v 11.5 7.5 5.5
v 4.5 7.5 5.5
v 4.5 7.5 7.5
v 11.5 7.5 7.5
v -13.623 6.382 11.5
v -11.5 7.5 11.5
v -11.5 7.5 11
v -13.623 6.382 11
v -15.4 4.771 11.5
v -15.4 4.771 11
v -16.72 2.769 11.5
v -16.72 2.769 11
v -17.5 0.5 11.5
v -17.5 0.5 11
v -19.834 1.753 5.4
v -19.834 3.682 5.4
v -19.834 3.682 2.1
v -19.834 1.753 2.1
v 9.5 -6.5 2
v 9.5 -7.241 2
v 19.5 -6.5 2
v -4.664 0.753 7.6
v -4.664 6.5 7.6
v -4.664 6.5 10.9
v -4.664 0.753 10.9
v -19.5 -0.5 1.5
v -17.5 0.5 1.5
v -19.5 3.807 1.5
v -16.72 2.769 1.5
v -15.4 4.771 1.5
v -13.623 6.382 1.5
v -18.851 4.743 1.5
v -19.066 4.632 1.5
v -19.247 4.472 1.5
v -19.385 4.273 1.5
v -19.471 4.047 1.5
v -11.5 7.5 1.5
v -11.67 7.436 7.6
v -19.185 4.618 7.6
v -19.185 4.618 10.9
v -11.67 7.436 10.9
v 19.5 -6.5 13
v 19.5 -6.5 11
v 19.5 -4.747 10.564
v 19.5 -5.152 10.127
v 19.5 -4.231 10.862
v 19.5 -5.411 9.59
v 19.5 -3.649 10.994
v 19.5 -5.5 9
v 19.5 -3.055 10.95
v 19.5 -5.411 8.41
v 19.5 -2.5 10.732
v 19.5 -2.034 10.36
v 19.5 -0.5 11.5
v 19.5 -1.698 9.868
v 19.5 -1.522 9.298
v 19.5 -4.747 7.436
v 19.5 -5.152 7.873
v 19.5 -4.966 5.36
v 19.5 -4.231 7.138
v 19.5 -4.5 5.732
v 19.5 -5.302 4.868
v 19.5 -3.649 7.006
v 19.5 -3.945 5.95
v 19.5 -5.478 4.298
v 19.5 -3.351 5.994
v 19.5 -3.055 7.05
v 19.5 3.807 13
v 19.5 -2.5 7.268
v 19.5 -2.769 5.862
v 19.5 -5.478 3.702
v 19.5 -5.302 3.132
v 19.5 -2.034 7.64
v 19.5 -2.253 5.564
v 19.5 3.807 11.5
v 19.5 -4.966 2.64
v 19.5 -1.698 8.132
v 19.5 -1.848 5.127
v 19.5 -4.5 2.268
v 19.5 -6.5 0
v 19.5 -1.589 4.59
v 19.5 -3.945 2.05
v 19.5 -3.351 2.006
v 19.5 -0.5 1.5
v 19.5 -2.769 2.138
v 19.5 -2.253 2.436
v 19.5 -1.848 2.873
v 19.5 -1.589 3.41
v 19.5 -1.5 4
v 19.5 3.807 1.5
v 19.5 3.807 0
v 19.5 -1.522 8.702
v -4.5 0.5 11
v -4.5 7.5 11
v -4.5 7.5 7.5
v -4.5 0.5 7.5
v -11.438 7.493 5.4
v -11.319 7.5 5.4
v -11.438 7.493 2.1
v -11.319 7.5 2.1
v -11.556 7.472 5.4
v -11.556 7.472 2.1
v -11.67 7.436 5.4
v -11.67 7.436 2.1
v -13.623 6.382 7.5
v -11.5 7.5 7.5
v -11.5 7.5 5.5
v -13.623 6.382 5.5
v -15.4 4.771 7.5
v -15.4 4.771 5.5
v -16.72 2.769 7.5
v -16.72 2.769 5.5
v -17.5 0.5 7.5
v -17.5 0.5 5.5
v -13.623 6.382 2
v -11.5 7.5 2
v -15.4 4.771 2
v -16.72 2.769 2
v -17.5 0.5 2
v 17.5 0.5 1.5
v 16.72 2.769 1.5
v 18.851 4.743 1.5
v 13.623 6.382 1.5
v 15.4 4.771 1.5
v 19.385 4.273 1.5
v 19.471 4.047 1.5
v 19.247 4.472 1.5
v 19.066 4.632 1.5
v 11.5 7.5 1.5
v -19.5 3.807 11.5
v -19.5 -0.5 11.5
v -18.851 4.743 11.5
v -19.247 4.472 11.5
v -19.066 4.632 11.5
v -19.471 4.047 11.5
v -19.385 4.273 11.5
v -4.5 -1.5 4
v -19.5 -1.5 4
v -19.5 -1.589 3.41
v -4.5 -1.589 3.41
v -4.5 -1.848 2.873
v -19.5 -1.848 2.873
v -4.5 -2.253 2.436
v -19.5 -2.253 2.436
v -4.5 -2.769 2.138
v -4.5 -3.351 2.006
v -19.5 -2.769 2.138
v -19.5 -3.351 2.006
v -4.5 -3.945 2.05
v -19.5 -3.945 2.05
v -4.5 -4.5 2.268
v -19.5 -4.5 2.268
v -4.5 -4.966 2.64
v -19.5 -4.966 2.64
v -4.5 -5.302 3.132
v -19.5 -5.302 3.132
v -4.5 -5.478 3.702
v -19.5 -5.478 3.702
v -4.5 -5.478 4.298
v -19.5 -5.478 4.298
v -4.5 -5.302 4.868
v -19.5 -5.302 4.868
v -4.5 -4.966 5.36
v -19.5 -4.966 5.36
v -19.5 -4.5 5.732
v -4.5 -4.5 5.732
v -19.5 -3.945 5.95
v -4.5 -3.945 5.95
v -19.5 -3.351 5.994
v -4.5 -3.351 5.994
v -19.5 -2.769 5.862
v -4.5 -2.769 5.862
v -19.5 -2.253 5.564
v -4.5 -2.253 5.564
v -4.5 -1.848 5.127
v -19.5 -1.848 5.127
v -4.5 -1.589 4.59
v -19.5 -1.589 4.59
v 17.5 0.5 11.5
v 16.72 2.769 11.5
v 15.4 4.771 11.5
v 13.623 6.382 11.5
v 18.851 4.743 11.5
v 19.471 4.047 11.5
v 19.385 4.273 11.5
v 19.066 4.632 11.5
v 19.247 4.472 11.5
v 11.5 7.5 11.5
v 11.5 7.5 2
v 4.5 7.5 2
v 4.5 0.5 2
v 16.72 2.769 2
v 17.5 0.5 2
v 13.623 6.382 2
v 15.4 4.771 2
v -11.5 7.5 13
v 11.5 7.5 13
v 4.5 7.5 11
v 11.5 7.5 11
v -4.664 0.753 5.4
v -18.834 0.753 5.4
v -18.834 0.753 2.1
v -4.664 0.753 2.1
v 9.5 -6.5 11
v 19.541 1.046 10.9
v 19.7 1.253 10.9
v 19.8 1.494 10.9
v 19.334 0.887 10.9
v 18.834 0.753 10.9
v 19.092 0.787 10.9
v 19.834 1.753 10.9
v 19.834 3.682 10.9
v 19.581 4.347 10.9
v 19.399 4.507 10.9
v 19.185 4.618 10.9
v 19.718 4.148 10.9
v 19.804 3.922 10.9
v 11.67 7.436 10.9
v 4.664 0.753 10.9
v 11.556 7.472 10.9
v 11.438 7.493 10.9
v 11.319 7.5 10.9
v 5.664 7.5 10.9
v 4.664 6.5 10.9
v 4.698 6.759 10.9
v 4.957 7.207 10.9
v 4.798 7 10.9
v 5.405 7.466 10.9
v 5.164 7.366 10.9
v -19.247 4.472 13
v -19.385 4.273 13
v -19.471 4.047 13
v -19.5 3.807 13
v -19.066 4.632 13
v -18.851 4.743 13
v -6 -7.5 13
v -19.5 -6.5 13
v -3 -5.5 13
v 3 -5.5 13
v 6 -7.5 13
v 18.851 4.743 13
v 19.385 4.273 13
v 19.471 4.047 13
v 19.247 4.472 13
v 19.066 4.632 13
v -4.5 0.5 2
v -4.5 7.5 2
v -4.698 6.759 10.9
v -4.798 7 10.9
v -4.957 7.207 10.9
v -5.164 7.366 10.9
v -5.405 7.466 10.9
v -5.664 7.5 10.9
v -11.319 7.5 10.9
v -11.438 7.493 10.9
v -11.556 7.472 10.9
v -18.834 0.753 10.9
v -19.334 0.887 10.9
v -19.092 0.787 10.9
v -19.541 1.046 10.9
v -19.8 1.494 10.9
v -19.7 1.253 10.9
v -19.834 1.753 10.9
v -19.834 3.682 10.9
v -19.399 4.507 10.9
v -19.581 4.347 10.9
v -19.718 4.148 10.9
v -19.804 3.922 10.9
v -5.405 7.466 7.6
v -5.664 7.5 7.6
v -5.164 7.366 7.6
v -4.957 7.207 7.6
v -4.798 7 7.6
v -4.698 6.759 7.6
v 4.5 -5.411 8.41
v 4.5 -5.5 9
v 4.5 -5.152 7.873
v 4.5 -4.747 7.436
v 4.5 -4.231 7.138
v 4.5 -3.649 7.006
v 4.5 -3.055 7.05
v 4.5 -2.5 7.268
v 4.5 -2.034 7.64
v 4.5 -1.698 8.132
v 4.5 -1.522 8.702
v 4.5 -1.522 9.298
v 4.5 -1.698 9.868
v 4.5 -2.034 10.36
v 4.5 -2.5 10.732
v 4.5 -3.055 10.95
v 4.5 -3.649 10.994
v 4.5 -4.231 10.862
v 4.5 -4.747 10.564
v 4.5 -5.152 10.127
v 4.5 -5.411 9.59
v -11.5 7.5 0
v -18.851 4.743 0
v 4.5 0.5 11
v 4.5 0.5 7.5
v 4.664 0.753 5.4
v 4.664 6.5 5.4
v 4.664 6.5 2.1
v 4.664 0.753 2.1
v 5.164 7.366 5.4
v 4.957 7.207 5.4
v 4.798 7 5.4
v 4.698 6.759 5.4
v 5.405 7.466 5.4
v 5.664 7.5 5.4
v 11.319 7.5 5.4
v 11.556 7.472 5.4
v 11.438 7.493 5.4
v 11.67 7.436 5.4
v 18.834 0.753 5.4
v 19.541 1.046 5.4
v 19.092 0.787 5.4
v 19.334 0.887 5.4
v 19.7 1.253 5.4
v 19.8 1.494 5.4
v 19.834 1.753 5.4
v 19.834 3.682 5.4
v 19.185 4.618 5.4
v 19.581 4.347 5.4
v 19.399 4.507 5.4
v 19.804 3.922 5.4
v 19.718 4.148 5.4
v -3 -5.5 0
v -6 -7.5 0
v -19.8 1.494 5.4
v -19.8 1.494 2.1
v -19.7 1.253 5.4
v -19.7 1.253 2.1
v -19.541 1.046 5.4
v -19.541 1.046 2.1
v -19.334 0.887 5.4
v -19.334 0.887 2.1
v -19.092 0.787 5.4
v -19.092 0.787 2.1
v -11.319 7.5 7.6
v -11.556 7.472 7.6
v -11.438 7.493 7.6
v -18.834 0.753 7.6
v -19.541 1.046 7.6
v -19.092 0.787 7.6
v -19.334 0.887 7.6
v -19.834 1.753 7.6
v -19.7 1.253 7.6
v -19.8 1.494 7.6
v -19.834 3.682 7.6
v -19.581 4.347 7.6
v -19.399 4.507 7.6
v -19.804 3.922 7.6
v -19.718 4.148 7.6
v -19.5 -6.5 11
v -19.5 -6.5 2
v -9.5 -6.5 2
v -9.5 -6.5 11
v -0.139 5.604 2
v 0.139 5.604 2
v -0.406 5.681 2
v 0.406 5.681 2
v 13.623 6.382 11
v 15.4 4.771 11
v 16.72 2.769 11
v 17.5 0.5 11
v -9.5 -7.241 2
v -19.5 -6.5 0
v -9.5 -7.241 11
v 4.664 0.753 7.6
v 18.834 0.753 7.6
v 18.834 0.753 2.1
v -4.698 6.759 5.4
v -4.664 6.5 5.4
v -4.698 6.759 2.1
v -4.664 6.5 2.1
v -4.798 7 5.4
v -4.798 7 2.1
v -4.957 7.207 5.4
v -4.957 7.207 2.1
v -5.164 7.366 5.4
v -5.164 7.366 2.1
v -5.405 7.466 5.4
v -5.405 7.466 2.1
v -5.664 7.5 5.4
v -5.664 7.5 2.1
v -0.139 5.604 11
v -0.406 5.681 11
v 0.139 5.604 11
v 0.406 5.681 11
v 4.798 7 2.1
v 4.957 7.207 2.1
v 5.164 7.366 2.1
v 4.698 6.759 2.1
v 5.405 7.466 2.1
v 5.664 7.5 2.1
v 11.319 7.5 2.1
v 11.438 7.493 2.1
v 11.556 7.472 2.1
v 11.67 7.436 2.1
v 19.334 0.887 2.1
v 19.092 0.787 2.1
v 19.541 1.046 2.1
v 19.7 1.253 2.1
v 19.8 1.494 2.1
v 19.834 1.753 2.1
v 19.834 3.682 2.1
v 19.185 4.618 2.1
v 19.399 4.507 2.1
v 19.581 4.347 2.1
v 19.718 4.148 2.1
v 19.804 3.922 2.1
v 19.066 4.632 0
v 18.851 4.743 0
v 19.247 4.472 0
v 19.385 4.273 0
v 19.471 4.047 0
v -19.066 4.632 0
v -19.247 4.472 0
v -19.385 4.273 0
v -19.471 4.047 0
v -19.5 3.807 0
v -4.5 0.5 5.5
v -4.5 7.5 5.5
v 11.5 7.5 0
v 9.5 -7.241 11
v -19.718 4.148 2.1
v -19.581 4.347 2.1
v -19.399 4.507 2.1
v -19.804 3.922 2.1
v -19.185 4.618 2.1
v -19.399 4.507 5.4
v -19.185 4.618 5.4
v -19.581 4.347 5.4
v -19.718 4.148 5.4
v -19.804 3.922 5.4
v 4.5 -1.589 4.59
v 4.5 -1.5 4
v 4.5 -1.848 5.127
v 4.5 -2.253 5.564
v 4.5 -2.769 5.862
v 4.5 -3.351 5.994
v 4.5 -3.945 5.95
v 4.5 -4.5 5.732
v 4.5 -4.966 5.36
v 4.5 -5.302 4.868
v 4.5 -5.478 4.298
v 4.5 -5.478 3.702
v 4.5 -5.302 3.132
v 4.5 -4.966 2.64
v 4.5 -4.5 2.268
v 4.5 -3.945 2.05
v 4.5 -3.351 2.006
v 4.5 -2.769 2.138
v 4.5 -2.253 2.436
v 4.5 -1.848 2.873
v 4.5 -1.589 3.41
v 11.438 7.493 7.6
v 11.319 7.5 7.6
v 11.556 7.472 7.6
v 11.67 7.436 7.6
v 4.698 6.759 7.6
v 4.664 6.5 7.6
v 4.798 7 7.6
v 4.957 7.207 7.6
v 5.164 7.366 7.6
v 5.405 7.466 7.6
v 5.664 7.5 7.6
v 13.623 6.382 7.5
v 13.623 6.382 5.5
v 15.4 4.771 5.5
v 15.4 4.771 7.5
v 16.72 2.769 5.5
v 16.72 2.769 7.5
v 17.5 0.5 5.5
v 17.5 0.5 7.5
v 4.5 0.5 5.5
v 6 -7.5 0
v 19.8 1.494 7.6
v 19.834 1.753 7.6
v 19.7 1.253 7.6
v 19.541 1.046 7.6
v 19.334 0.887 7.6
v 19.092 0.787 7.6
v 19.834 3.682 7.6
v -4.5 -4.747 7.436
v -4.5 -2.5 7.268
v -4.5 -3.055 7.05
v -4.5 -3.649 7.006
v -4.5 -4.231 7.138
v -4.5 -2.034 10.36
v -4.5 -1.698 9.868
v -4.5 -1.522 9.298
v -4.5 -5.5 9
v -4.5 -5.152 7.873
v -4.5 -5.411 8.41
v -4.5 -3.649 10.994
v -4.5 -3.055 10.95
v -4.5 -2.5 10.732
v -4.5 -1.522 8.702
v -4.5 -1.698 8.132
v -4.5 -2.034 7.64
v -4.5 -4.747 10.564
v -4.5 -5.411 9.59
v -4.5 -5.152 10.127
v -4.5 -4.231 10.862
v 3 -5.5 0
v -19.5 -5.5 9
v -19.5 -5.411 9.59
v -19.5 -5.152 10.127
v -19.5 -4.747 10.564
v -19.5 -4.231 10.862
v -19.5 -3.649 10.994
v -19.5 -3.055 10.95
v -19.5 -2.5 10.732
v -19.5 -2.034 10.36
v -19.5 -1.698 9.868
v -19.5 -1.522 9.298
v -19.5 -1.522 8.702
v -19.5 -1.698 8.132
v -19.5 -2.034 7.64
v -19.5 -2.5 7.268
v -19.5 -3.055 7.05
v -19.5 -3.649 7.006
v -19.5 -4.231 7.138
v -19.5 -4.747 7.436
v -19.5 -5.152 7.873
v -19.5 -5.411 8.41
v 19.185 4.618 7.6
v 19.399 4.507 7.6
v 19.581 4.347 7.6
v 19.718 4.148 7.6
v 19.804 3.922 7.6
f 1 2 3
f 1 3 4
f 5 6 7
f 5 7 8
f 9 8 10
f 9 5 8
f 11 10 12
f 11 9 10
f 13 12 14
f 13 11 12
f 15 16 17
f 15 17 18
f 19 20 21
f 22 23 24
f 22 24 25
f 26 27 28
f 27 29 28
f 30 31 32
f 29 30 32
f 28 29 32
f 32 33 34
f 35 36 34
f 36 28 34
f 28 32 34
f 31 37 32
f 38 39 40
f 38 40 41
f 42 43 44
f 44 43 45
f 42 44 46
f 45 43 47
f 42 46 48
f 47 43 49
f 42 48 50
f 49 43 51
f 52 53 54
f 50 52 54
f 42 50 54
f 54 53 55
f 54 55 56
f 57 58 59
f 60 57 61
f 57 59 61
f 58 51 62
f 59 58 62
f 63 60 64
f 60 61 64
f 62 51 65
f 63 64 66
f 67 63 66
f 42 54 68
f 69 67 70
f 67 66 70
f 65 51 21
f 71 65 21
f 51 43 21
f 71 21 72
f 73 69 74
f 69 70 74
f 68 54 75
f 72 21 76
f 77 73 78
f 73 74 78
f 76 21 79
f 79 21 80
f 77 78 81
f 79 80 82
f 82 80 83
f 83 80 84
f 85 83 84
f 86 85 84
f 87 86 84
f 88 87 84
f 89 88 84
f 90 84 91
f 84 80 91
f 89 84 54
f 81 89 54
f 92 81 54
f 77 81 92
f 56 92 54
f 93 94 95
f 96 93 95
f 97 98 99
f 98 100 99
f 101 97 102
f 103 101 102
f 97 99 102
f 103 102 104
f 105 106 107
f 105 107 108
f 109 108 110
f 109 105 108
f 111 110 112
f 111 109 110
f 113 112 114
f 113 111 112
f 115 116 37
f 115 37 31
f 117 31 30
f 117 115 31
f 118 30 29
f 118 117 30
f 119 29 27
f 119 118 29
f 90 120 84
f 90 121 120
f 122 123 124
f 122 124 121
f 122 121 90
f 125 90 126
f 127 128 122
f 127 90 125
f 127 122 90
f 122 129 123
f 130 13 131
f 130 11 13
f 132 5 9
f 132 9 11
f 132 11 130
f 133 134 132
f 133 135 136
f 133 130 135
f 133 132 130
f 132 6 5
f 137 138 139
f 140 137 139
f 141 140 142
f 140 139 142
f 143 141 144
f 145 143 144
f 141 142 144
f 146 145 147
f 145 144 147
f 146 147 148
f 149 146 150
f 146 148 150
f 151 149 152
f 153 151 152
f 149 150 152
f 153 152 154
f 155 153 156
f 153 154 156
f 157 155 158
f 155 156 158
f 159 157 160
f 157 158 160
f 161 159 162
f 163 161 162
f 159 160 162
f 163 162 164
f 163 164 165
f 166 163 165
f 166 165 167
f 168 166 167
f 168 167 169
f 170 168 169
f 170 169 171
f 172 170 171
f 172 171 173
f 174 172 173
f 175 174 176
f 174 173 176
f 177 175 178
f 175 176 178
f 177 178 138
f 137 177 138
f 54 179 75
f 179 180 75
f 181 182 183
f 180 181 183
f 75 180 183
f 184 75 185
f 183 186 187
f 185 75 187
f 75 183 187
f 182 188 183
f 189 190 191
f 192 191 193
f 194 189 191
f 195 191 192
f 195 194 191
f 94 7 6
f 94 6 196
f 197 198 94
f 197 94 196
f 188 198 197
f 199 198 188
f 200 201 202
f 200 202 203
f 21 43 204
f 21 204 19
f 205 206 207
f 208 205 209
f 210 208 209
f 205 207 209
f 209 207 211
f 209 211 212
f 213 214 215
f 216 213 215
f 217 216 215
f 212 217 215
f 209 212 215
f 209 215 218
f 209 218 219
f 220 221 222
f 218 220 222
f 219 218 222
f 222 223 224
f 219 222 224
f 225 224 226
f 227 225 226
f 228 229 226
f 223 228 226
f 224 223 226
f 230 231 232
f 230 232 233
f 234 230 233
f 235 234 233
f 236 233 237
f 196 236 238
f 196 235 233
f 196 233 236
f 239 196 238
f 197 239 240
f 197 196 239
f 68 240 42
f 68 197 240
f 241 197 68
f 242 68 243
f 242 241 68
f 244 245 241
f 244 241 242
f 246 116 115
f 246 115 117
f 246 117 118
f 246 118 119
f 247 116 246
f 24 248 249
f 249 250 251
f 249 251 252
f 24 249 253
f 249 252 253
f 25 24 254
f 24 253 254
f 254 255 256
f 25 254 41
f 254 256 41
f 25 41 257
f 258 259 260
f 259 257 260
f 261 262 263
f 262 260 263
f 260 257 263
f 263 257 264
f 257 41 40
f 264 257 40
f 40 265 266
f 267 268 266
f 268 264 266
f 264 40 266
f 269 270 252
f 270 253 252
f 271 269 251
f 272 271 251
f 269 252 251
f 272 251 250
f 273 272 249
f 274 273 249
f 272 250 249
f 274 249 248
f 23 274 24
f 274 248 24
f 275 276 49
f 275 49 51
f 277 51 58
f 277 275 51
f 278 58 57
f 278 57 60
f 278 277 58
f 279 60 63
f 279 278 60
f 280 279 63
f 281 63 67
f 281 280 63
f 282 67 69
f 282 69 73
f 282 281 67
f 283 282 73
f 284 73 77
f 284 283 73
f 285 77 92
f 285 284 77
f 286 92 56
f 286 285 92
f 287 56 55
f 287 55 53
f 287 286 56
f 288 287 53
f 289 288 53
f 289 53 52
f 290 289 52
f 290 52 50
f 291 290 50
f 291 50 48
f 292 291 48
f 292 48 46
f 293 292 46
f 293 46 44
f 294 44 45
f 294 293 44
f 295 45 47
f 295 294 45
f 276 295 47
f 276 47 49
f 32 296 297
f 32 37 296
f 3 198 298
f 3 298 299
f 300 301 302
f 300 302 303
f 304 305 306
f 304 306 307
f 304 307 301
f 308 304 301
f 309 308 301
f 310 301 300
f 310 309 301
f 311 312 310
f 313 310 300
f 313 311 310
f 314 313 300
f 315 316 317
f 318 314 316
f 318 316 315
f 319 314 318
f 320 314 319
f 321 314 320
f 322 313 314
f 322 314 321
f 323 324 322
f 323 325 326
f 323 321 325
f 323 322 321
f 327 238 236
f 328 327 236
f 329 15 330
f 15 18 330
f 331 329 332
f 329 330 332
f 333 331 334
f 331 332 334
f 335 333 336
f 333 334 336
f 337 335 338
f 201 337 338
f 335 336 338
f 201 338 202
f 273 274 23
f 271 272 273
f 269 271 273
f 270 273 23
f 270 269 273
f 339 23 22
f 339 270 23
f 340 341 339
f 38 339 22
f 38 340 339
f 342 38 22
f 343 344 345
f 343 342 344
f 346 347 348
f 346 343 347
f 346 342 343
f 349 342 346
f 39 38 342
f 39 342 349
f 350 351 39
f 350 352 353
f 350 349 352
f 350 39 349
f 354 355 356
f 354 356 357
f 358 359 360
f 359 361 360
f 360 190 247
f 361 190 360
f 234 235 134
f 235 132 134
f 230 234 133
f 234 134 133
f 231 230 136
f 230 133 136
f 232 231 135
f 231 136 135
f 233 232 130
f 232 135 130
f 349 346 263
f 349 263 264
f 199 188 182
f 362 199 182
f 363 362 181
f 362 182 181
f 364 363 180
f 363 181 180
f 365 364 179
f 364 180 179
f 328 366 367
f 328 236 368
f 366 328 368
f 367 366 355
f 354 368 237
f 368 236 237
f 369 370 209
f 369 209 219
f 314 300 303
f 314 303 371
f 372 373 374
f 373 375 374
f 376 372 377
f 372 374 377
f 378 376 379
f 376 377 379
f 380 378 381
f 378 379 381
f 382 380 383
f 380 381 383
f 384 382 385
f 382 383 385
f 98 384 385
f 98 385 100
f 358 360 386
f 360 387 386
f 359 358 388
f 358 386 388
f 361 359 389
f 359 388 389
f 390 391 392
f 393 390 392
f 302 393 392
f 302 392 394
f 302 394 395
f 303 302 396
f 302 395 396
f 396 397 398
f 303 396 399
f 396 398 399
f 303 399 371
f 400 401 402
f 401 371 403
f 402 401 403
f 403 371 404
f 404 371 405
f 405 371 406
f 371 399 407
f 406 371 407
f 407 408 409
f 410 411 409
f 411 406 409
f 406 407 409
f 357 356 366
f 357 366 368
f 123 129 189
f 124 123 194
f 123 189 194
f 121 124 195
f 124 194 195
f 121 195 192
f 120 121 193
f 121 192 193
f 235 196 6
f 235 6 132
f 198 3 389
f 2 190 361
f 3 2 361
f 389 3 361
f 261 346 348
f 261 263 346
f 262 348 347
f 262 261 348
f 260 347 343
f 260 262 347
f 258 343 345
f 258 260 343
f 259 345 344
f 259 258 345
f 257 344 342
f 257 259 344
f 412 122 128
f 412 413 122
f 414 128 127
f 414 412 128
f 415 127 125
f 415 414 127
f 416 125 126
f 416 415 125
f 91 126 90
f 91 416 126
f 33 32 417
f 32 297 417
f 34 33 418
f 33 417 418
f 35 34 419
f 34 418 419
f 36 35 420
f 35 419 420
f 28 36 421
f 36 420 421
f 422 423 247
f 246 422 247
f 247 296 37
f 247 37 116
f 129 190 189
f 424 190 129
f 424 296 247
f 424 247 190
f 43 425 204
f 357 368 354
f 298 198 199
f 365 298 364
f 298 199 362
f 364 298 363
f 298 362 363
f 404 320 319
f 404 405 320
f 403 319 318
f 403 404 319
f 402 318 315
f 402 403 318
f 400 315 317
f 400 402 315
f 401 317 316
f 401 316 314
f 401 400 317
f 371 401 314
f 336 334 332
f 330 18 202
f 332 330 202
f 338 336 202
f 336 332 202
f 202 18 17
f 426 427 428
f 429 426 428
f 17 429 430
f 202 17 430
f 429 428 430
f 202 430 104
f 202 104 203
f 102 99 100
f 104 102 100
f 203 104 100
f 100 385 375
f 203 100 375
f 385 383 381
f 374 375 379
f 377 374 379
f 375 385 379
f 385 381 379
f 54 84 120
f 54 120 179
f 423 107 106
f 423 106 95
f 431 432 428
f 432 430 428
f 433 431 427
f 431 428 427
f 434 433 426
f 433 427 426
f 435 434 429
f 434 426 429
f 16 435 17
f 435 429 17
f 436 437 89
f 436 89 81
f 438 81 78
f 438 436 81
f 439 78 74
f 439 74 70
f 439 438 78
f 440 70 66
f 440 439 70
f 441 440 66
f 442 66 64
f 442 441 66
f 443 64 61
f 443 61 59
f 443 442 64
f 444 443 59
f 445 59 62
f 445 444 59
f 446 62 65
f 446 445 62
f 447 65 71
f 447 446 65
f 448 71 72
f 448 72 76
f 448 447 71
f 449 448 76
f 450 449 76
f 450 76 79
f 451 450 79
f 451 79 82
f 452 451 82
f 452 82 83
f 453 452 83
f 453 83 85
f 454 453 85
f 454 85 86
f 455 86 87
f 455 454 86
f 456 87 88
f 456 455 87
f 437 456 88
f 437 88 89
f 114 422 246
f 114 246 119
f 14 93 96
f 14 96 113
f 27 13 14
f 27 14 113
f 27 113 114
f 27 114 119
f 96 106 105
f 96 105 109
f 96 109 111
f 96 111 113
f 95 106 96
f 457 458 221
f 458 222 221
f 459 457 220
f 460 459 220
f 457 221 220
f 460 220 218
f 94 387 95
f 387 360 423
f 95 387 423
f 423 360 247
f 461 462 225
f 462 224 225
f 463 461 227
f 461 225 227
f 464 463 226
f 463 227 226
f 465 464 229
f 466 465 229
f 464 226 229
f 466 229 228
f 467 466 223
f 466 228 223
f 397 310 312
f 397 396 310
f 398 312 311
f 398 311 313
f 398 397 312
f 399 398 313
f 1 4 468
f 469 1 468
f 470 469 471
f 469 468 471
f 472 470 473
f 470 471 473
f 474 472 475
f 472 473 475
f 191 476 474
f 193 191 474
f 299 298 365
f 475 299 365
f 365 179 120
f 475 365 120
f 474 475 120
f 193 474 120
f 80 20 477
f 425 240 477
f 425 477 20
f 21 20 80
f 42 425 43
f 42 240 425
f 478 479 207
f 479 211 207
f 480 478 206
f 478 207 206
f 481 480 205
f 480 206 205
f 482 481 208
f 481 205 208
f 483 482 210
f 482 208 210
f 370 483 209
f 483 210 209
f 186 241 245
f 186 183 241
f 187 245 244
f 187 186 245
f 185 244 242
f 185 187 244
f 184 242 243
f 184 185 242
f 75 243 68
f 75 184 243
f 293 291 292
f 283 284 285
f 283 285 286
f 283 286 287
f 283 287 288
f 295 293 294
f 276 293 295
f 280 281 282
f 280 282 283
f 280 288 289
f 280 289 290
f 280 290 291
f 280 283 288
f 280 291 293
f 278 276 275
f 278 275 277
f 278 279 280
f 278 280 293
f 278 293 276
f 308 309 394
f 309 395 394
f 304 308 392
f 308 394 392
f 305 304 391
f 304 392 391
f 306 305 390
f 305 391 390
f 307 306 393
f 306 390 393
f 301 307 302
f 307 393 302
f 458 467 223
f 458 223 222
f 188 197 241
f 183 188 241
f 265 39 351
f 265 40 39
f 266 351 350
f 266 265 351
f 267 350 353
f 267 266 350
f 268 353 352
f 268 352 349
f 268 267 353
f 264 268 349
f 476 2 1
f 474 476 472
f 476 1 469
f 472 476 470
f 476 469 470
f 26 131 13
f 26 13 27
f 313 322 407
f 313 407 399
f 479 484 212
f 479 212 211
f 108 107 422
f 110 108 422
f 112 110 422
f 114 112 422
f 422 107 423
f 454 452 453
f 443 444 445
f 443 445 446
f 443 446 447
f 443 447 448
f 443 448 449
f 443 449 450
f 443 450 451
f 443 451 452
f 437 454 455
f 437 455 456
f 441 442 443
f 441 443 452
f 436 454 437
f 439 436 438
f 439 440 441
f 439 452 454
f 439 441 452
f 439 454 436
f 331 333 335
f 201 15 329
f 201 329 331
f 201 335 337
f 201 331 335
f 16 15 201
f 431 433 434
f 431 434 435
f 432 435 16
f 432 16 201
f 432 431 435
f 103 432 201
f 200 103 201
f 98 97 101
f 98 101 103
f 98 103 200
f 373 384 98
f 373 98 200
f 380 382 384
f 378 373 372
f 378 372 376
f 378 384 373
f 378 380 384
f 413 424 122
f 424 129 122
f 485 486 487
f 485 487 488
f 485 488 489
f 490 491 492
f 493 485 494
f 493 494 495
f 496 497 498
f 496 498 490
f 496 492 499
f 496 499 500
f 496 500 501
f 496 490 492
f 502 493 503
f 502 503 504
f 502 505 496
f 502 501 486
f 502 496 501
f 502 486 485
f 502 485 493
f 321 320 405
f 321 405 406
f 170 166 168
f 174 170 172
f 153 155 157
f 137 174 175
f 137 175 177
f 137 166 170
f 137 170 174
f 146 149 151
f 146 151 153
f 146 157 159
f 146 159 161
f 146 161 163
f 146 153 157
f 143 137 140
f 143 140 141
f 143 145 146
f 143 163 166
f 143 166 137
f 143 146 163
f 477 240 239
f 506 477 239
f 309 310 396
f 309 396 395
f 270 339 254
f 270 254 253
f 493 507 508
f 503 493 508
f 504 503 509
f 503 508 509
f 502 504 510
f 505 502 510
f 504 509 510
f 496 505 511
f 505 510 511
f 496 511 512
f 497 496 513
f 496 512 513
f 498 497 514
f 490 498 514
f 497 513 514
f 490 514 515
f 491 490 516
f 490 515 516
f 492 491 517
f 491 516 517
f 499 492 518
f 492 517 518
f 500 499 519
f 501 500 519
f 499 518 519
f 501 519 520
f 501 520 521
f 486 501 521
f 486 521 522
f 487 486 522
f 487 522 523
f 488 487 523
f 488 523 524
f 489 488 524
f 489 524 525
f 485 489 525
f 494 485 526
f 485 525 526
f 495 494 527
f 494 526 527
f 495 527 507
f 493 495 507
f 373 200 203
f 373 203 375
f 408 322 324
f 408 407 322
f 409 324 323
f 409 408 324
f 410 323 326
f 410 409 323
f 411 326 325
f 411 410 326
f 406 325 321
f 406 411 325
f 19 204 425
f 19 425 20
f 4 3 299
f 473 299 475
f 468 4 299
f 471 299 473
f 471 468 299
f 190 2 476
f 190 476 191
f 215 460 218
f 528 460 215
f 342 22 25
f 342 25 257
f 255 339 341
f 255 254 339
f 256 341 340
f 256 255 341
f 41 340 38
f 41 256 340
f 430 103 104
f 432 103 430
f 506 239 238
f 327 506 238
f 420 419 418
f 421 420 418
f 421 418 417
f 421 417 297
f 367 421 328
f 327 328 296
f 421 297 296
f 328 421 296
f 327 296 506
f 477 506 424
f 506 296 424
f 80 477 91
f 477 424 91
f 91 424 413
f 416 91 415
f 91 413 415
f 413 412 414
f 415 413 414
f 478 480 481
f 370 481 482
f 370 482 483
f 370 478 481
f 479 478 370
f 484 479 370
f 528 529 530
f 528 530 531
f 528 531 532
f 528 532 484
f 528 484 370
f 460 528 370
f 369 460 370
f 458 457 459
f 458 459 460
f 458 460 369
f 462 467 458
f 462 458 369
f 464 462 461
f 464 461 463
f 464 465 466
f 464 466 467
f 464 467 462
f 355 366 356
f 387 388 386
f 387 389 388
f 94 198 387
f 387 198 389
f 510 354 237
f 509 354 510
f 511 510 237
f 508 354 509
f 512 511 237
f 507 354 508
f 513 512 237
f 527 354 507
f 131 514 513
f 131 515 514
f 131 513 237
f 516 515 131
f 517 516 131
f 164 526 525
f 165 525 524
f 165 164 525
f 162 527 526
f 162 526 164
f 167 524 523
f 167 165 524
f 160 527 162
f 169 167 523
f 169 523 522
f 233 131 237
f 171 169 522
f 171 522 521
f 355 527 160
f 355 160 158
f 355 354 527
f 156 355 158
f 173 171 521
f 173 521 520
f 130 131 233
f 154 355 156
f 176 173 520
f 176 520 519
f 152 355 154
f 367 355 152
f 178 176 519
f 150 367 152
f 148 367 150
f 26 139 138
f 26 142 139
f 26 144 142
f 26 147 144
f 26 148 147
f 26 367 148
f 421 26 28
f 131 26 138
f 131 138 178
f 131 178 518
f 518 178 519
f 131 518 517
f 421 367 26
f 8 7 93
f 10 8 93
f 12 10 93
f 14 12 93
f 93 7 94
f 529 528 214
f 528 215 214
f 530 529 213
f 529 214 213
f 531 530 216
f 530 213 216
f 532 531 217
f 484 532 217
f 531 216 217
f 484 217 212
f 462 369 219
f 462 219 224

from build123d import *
from OCP.BRepFilletAPI import BRepFilletAPI_MakeChamfer

# Parameters (mm, degrees)
CROQUIS1_W                  = 39
CROQUIS1_H                  = 15
SALIENTE_EXTRUIR1_DEPTH     = 13
CORTAR_EXTRUIR1_DEPTH       = 13
CORTAR_EXTRUIR2_DEPTH       = 25.606909599
CROQUIS4_W                  = 9
CROQUIS4_H                  = 1
CORTAR_EXTRUIR3_DEPTH       = 10
CROQUIS5_W                  = 9
CROQUIS5_H                  = 1
CORTAR_EXTRUIR4_DEPTH       = 10
CORTAR_EXTRUIR5_START       = -2
CORTAR_EXTRUIR5_DEPTH       = 9
CROQUIS7_R                  = 2
CORTAR_EXTRUIR10_DEPTH      = 15
CORTAR_EXTRUIR11_START      = -15
CROQUIS8_R                  = 2
CORTAR_EXTRUIR11_DEPTH      = 15
CROQUIS9_W                  = 15
CROQUIS9_H                  = 3.5
CORTAR_EXTRUIR12_DEPTH      = 7
CORTAR_EXTRUIR13_DEPTH      = 4
CORTAR_EXTRUIR13_DEPTH_BACK = 6
CHAFL_N1_SIZE               = 2
CHAFL_N1_SIZE_2             = 1
SALIENTE_EXTRUIR2_START     = 0.1
SALIENTE_EXTRUIR2_DEPTH     = 3.3
SALIENTE_EXTRUIR2_2_DEPTH   = 3.3
SALIENTE_EXTRUIR3_START     = 2.2
SALIENTE_EXTRUIR3_DEPTH     = 3.3
SALIENTE_EXTRUIR3_2_DEPTH   = 3.3
REDONDEO1_R                 = 1
REDONDEO2_R                 = 1
REDONDEO3_R                 = 1
REDONDEO4_R                 = 1
REDONDEO5_R                 = 1
REDONDEO6_R                 = 1
REDONDEO7_R                 = 1
REDONDEO8_R                 = 1
REDONDEO12_R                = 1
REDONDEO13_R                = 1
REDONDEO14_R                = 1
REDONDEO15_R                = 1
REDONDEO16_R                = 1
REDONDEO17_R                = 1


with BuildPart() as part:
    # Croquis1 → Saliente-Extruir1 (new body)
    with BuildSketch(Plane.XY):
        Rectangle(CROQUIS1_W, CROQUIS1_H)
    extrude(amount=SALIENTE_EXTRUIR1_DEPTH)

    # Croquis2 → Cortar-Extruir1 (cut)
    with BuildSketch(Plane.XY.offset(13)):
        Polygon((0, -5.5), (0, -7.5), (6, -7.5), (3, -5.5), align=None)
        Polygon((-6, -7.5), (0, -7.5), (0, -5.5), (-3, -5.5), align=None)
        Polygon((-19.5, -7.5), (-6, -7.5), (-19.5, -6.5), align=None)
        Polygon((6, -7.5), (19.5, -6.5), (19.5, -7.5), align=None)
    extrude(amount=-CORTAR_EXTRUIR1_DEPTH, mode=Mode.SUBTRACT)

    # Croquis3 → Cortar-Extruir2 (cut, through all)
    with BuildSketch(Plane.XY.offset(13)):
        Polygon((-11.5, 7.5), (-19.5, 4.5), (-19.5, 7.5), align=None)
        Polygon((19.5, 4.5), (19.5, 7.5), (11.5, 7.5), align=None)
    extrude(amount=-CORTAR_EXTRUIR2_DEPTH, mode=Mode.SUBTRACT)

    # Croquis4 → Cortar-Extruir3 (cut)
    with BuildSketch(Plane(origin=(19.5, 0, 0), x_dir=(0, 0, -1), z_dir=(1, 0, 0))):
        with Locations((-6.5, -7)):
            Rectangle(CROQUIS4_W, CROQUIS4_H)
    extrude(amount=-CORTAR_EXTRUIR3_DEPTH, mode=Mode.SUBTRACT)

    # Croquis5 → Cortar-Extruir4 (cut)
    with BuildSketch(Plane.ZY.offset(19.5)):
        with Locations((6.5, -7)):
            Rectangle(CROQUIS5_W, CROQUIS5_H)
    extrude(amount=-CORTAR_EXTRUIR4_DEPTH, mode=Mode.SUBTRACT)

    # Croquis6 → Cortar-Extruir5 (cut)
    with BuildSketch(Plane(origin=(0, 0, 0), x_dir=(-1, 0, 0), z_dir=(0, 0, -1)).offset(CORTAR_EXTRUIR5_START)):
        Polygon((4.5, 7.5), (-4.5, 7.5), (0, 5.5), align=None)
    extrude(amount=-CORTAR_EXTRUIR5_DEPTH, mode=Mode.SUBTRACT)

    # Croquis7 → Cortar-Extruir10 (cut)
    with BuildSketch(Plane.ZY.offset(19.5)):
        with Locations(Location((9, -3.5, 0), (0, 0, 270))):
            Circle(CROQUIS7_R)
        with Locations(Location((4, -3.5, 0), (0, 0, 90))):
            Circle(CROQUIS7_R)
    extrude(amount=-CORTAR_EXTRUIR10_DEPTH, mode=Mode.SUBTRACT)

    # Croquis8 → Cortar-Extruir11 (cut)
    with BuildSketch(Plane(origin=(19.5, 0, 0), x_dir=(0, 0, -1), z_dir=(1, 0, 0)).offset(CORTAR_EXTRUIR11_START)):
        with Locations(Location((-9, -3.5, 0), (0, 0, 270))):
            Circle(CROQUIS8_R)
        with Locations(Location((-4, -3.5, 0), (0, 0, 90))):
            Circle(CROQUIS8_R)
    extrude(amount=CORTAR_EXTRUIR11_DEPTH, mode=Mode.SUBTRACT)

    # Croquis9 → Cortar-Extruir12 (cut)
    with BuildSketch(Plane(origin=(0, 7.5, 0), x_dir=(1, 0, 0), z_dir=(0, 1, 0))):
        with Locations((12, -3.75)):
            Rectangle(CROQUIS9_W, CROQUIS9_H)
        with Locations((-12, -3.75)):
            Rectangle(CROQUIS9_W, CROQUIS9_H)
        with Locations((-12, -9.25)):
            Rectangle(CROQUIS9_W, CROQUIS9_H)
        with Locations((12, -9.25)):
            Rectangle(CROQUIS9_W, CROQUIS9_H)
    extrude(amount=-CORTAR_EXTRUIR12_DEPTH, mode=Mode.SUBTRACT)

    # Croquis10 → Cortar-Extruir13 (cut, two sides: drawn at the far end of the back side and taken through both)
    with BuildSketch(Plane(origin=(0, 0, 5.5), x_dir=(-1, 0, 0), z_dir=(0, 0, -1)).offset(-CORTAR_EXTRUIR13_DEPTH_BACK)):
        with BuildLine():
            Line((17.5, 0.5), (19.5, 0.5))
            Line((19.5, 0.5), (19.5, 4.5))
            Line((19.5, 4.5), (11.5, 7.5))
            ThreePointArc((11.5, 7.5), (15.400036271, 4.771459661), (17.5, 0.5))
        make_face()
        with BuildLine():
            Line((-19.5, 4.5), (-11.5, 7.5))
            ThreePointArc((-11.5, 7.5), (-15.400036271, 4.771459661), (-17.5, 0.5))
            Line((-17.5, 0.5), (-19.5, 0.5))
            Line((-19.5, 0.5), (-19.5, 4.5))
        make_face()
    extrude(amount=CORTAR_EXTRUIR13_DEPTH + CORTAR_EXTRUIR13_DEPTH_BACK, mode=Mode.SUBTRACT)

    # Chaflán1
    chafl_n1_edges_1 = [part.edges().sort_by_distance(p)[0] for p in [
        (-19.5, 0.5, 6.5),
    ]]
    chafl_n1_side_1 = [part.faces().sort_by_distance(p)[0] for p in [
        (-19.48, 0.5, 6.5),
    ]]
    chafl_n1_edges_2 = [part.edges().sort_by_distance(p)[0] for p in [
        (19.5, 0.5, 6.5),
    ]]
    chafl_n1_side_2 = [part.faces().sort_by_distance(p)[0] for p in [
        (19.48, 0.5, 6.5),
    ]]
    chafl_n1 = BRepFilletAPI_MakeChamfer(part.part.solid().wrapped)
    for e in chafl_n1_edges_1:
        chafl_n1.Add(CHAFL_N1_SIZE - 0.0001, CHAFL_N1_SIZE_2 - 0.0001, e.wrapped, chafl_n1_side_1[0].wrapped)
    for e in chafl_n1_edges_2:
        chafl_n1.Add(CHAFL_N1_SIZE - 0.0001, CHAFL_N1_SIZE_2 - 0.0001, e.wrapped, chafl_n1_side_2[0].wrapped)
    add(Compound.cast(chafl_n1.Shape()), mode=Mode.REPLACE)  # a hair under: the kernel refuses the full size

    # Redondeo12
    redondeo12_edges = [part.edges().sort_by_distance(p)[0] for p in [
        (0, 5.5, 6.5),
    ]]
    fillet(redondeo12_edges, radius=REDONDEO12_R)

    # Redondeo13
    redondeo13_edges = [part.edges().sort_by_distance(p)[0] for p in [
        (19.5, 4.5, 12.25),
        (-19.5, 4.5, 12.25),
        (-19.5, 4.5, 0.75),
        (19.5, 4.5, 0.75),
    ]]
    fillet(redondeo13_edges, radius=REDONDEO13_R)


with BuildPart() as body_2:
    # Croquis11 → Saliente-Extruir2 (new body)
    with BuildSketch(Plane.XY.offset(7.5).offset(SALIENTE_EXTRUIR2_START)):
        Polygon((11.5, 7.5), (19.833617862, 4.374893302), (19.833617862, 0.752903639), (4.663883378, 0.752903639), (4.663883378, 7.5), align=None)
    extrude(amount=SALIENTE_EXTRUIR2_DEPTH)

    # Redondeo2
    redondeo2_edges = [body_2.edges().sort_by_distance(p)[0] for p in [
        (4.663883378, 7.5, 9.25),
    ]]
    fillet(redondeo2_edges, radius=REDONDEO2_R)

    # Redondeo7
    redondeo7_edges = [body_2.edges().sort_by_distance(p)[0] for p in [
        (11.5, 7.5, 9.25),
    ]]
    fillet(redondeo7_edges, radius=REDONDEO7_R)

    # Redondeo17
    redondeo17_edges = [body_2.edges().sort_by_distance(p)[0] for p in [
        (19.833617862, 0.752903639, 9.25),
        (19.833617862, 4.374893302, 9.25),
    ]]
    fillet(redondeo17_edges, radius=REDONDEO17_R)


with BuildPart() as body_3:
    # Croquis11 → Saliente-Extruir2 2 (new body)
    with BuildSketch(Plane.XY.offset(7.5).offset(SALIENTE_EXTRUIR2_START)):
        Polygon((-19.833617862, 0.752903639), (-19.833617862, 4.374893302), (-11.5, 7.5), (-4.663883378, 7.5), (-4.663883378, 0.752903639), align=None)
    extrude(amount=SALIENTE_EXTRUIR2_2_DEPTH)

    # Redondeo4
    redondeo4_edges = [body_3.edges().sort_by_distance(p)[0] for p in [
        (-4.663883378, 7.5, 9.25),
    ]]
    fillet(redondeo4_edges, radius=REDONDEO4_R)

    # Redondeo5
    redondeo5_edges = [body_3.edges().sort_by_distance(p)[0] for p in [
        (-11.5, 7.5, 9.25),
    ]]
    fillet(redondeo5_edges, radius=REDONDEO5_R)

    # Redondeo15
    redondeo15_edges = [body_3.edges().sort_by_distance(p)[0] for p in [
        (-19.833617862, 4.374893302, 9.25),
        (-19.833617862, 0.752903639, 9.25),
    ]]
    fillet(redondeo15_edges, radius=REDONDEO15_R)


with BuildPart() as body_4:
    # Croquis12 → Saliente-Extruir3 (new body)
    with BuildSketch(Plane(origin=(0, 0, 7.6), x_dir=(-1, 0, 0), z_dir=(0, 0, -1)).offset(SALIENTE_EXTRUIR3_START)):
        Polygon((11.5, 7.5), (19.833617862, 4.374893302), (19.833617862, 0.752903639), (4.663883378, 0.752903639), (4.663883378, 7.5), align=None)
    extrude(amount=SALIENTE_EXTRUIR3_DEPTH)

    # Redondeo3
    redondeo3_edges = [body_4.edges().sort_by_distance(p)[0] for p in [
        (-4.663883378, 7.5, 3.75),
    ]]
    fillet(redondeo3_edges, radius=REDONDEO3_R)

    # Redondeo6
    redondeo6_edges = [body_4.edges().sort_by_distance(p)[0] for p in [
        (-11.5, 7.5, 3.75),
    ]]
    fillet(redondeo6_edges, radius=REDONDEO6_R)

    # Redondeo14
    redondeo14_edges = [body_4.edges().sort_by_distance(p)[0] for p in [
        (-19.833617862, 0.752903639, 3.75),
        (-19.833617862, 4.374893302, 3.75),
    ]]
    fillet(redondeo14_edges, radius=REDONDEO14_R)


with BuildPart() as body_5:
    # Croquis12 → Saliente-Extruir3 2 (new body)
    with BuildSketch(Plane(origin=(0, 0, 7.6), x_dir=(-1, 0, 0), z_dir=(0, 0, -1)).offset(SALIENTE_EXTRUIR3_START)):
        Polygon((-19.833617862, 0.752903639), (-19.833617862, 4.374893302), (-11.5, 7.5), (-4.663883378, 7.5), (-4.663883378, 0.752903639), align=None)
    extrude(amount=SALIENTE_EXTRUIR3_2_DEPTH)

    # Redondeo1
    redondeo1_edges = [body_5.edges().sort_by_distance(p)[0] for p in [
        (4.663883378, 7.5, 3.75),
    ]]
    fillet(redondeo1_edges, radius=REDONDEO1_R)

    # Redondeo8
    redondeo8_edges = [body_5.edges().sort_by_distance(p)[0] for p in [
        (11.5, 7.5, 3.75),
    ]]
    fillet(redondeo8_edges, radius=REDONDEO8_R)

    # Redondeo16
    redondeo16_edges = [body_5.edges().sort_by_distance(p)[0] for p in [
        (19.833617862, 4.374893302, 3.75),
        (19.833617862, 0.752903639, 3.75),
    ]]
    fillet(redondeo16_edges, radius=REDONDEO16_R)


solid = Compound([part.part, body_2.part, body_3.part, body_4.part, body_5.part])
